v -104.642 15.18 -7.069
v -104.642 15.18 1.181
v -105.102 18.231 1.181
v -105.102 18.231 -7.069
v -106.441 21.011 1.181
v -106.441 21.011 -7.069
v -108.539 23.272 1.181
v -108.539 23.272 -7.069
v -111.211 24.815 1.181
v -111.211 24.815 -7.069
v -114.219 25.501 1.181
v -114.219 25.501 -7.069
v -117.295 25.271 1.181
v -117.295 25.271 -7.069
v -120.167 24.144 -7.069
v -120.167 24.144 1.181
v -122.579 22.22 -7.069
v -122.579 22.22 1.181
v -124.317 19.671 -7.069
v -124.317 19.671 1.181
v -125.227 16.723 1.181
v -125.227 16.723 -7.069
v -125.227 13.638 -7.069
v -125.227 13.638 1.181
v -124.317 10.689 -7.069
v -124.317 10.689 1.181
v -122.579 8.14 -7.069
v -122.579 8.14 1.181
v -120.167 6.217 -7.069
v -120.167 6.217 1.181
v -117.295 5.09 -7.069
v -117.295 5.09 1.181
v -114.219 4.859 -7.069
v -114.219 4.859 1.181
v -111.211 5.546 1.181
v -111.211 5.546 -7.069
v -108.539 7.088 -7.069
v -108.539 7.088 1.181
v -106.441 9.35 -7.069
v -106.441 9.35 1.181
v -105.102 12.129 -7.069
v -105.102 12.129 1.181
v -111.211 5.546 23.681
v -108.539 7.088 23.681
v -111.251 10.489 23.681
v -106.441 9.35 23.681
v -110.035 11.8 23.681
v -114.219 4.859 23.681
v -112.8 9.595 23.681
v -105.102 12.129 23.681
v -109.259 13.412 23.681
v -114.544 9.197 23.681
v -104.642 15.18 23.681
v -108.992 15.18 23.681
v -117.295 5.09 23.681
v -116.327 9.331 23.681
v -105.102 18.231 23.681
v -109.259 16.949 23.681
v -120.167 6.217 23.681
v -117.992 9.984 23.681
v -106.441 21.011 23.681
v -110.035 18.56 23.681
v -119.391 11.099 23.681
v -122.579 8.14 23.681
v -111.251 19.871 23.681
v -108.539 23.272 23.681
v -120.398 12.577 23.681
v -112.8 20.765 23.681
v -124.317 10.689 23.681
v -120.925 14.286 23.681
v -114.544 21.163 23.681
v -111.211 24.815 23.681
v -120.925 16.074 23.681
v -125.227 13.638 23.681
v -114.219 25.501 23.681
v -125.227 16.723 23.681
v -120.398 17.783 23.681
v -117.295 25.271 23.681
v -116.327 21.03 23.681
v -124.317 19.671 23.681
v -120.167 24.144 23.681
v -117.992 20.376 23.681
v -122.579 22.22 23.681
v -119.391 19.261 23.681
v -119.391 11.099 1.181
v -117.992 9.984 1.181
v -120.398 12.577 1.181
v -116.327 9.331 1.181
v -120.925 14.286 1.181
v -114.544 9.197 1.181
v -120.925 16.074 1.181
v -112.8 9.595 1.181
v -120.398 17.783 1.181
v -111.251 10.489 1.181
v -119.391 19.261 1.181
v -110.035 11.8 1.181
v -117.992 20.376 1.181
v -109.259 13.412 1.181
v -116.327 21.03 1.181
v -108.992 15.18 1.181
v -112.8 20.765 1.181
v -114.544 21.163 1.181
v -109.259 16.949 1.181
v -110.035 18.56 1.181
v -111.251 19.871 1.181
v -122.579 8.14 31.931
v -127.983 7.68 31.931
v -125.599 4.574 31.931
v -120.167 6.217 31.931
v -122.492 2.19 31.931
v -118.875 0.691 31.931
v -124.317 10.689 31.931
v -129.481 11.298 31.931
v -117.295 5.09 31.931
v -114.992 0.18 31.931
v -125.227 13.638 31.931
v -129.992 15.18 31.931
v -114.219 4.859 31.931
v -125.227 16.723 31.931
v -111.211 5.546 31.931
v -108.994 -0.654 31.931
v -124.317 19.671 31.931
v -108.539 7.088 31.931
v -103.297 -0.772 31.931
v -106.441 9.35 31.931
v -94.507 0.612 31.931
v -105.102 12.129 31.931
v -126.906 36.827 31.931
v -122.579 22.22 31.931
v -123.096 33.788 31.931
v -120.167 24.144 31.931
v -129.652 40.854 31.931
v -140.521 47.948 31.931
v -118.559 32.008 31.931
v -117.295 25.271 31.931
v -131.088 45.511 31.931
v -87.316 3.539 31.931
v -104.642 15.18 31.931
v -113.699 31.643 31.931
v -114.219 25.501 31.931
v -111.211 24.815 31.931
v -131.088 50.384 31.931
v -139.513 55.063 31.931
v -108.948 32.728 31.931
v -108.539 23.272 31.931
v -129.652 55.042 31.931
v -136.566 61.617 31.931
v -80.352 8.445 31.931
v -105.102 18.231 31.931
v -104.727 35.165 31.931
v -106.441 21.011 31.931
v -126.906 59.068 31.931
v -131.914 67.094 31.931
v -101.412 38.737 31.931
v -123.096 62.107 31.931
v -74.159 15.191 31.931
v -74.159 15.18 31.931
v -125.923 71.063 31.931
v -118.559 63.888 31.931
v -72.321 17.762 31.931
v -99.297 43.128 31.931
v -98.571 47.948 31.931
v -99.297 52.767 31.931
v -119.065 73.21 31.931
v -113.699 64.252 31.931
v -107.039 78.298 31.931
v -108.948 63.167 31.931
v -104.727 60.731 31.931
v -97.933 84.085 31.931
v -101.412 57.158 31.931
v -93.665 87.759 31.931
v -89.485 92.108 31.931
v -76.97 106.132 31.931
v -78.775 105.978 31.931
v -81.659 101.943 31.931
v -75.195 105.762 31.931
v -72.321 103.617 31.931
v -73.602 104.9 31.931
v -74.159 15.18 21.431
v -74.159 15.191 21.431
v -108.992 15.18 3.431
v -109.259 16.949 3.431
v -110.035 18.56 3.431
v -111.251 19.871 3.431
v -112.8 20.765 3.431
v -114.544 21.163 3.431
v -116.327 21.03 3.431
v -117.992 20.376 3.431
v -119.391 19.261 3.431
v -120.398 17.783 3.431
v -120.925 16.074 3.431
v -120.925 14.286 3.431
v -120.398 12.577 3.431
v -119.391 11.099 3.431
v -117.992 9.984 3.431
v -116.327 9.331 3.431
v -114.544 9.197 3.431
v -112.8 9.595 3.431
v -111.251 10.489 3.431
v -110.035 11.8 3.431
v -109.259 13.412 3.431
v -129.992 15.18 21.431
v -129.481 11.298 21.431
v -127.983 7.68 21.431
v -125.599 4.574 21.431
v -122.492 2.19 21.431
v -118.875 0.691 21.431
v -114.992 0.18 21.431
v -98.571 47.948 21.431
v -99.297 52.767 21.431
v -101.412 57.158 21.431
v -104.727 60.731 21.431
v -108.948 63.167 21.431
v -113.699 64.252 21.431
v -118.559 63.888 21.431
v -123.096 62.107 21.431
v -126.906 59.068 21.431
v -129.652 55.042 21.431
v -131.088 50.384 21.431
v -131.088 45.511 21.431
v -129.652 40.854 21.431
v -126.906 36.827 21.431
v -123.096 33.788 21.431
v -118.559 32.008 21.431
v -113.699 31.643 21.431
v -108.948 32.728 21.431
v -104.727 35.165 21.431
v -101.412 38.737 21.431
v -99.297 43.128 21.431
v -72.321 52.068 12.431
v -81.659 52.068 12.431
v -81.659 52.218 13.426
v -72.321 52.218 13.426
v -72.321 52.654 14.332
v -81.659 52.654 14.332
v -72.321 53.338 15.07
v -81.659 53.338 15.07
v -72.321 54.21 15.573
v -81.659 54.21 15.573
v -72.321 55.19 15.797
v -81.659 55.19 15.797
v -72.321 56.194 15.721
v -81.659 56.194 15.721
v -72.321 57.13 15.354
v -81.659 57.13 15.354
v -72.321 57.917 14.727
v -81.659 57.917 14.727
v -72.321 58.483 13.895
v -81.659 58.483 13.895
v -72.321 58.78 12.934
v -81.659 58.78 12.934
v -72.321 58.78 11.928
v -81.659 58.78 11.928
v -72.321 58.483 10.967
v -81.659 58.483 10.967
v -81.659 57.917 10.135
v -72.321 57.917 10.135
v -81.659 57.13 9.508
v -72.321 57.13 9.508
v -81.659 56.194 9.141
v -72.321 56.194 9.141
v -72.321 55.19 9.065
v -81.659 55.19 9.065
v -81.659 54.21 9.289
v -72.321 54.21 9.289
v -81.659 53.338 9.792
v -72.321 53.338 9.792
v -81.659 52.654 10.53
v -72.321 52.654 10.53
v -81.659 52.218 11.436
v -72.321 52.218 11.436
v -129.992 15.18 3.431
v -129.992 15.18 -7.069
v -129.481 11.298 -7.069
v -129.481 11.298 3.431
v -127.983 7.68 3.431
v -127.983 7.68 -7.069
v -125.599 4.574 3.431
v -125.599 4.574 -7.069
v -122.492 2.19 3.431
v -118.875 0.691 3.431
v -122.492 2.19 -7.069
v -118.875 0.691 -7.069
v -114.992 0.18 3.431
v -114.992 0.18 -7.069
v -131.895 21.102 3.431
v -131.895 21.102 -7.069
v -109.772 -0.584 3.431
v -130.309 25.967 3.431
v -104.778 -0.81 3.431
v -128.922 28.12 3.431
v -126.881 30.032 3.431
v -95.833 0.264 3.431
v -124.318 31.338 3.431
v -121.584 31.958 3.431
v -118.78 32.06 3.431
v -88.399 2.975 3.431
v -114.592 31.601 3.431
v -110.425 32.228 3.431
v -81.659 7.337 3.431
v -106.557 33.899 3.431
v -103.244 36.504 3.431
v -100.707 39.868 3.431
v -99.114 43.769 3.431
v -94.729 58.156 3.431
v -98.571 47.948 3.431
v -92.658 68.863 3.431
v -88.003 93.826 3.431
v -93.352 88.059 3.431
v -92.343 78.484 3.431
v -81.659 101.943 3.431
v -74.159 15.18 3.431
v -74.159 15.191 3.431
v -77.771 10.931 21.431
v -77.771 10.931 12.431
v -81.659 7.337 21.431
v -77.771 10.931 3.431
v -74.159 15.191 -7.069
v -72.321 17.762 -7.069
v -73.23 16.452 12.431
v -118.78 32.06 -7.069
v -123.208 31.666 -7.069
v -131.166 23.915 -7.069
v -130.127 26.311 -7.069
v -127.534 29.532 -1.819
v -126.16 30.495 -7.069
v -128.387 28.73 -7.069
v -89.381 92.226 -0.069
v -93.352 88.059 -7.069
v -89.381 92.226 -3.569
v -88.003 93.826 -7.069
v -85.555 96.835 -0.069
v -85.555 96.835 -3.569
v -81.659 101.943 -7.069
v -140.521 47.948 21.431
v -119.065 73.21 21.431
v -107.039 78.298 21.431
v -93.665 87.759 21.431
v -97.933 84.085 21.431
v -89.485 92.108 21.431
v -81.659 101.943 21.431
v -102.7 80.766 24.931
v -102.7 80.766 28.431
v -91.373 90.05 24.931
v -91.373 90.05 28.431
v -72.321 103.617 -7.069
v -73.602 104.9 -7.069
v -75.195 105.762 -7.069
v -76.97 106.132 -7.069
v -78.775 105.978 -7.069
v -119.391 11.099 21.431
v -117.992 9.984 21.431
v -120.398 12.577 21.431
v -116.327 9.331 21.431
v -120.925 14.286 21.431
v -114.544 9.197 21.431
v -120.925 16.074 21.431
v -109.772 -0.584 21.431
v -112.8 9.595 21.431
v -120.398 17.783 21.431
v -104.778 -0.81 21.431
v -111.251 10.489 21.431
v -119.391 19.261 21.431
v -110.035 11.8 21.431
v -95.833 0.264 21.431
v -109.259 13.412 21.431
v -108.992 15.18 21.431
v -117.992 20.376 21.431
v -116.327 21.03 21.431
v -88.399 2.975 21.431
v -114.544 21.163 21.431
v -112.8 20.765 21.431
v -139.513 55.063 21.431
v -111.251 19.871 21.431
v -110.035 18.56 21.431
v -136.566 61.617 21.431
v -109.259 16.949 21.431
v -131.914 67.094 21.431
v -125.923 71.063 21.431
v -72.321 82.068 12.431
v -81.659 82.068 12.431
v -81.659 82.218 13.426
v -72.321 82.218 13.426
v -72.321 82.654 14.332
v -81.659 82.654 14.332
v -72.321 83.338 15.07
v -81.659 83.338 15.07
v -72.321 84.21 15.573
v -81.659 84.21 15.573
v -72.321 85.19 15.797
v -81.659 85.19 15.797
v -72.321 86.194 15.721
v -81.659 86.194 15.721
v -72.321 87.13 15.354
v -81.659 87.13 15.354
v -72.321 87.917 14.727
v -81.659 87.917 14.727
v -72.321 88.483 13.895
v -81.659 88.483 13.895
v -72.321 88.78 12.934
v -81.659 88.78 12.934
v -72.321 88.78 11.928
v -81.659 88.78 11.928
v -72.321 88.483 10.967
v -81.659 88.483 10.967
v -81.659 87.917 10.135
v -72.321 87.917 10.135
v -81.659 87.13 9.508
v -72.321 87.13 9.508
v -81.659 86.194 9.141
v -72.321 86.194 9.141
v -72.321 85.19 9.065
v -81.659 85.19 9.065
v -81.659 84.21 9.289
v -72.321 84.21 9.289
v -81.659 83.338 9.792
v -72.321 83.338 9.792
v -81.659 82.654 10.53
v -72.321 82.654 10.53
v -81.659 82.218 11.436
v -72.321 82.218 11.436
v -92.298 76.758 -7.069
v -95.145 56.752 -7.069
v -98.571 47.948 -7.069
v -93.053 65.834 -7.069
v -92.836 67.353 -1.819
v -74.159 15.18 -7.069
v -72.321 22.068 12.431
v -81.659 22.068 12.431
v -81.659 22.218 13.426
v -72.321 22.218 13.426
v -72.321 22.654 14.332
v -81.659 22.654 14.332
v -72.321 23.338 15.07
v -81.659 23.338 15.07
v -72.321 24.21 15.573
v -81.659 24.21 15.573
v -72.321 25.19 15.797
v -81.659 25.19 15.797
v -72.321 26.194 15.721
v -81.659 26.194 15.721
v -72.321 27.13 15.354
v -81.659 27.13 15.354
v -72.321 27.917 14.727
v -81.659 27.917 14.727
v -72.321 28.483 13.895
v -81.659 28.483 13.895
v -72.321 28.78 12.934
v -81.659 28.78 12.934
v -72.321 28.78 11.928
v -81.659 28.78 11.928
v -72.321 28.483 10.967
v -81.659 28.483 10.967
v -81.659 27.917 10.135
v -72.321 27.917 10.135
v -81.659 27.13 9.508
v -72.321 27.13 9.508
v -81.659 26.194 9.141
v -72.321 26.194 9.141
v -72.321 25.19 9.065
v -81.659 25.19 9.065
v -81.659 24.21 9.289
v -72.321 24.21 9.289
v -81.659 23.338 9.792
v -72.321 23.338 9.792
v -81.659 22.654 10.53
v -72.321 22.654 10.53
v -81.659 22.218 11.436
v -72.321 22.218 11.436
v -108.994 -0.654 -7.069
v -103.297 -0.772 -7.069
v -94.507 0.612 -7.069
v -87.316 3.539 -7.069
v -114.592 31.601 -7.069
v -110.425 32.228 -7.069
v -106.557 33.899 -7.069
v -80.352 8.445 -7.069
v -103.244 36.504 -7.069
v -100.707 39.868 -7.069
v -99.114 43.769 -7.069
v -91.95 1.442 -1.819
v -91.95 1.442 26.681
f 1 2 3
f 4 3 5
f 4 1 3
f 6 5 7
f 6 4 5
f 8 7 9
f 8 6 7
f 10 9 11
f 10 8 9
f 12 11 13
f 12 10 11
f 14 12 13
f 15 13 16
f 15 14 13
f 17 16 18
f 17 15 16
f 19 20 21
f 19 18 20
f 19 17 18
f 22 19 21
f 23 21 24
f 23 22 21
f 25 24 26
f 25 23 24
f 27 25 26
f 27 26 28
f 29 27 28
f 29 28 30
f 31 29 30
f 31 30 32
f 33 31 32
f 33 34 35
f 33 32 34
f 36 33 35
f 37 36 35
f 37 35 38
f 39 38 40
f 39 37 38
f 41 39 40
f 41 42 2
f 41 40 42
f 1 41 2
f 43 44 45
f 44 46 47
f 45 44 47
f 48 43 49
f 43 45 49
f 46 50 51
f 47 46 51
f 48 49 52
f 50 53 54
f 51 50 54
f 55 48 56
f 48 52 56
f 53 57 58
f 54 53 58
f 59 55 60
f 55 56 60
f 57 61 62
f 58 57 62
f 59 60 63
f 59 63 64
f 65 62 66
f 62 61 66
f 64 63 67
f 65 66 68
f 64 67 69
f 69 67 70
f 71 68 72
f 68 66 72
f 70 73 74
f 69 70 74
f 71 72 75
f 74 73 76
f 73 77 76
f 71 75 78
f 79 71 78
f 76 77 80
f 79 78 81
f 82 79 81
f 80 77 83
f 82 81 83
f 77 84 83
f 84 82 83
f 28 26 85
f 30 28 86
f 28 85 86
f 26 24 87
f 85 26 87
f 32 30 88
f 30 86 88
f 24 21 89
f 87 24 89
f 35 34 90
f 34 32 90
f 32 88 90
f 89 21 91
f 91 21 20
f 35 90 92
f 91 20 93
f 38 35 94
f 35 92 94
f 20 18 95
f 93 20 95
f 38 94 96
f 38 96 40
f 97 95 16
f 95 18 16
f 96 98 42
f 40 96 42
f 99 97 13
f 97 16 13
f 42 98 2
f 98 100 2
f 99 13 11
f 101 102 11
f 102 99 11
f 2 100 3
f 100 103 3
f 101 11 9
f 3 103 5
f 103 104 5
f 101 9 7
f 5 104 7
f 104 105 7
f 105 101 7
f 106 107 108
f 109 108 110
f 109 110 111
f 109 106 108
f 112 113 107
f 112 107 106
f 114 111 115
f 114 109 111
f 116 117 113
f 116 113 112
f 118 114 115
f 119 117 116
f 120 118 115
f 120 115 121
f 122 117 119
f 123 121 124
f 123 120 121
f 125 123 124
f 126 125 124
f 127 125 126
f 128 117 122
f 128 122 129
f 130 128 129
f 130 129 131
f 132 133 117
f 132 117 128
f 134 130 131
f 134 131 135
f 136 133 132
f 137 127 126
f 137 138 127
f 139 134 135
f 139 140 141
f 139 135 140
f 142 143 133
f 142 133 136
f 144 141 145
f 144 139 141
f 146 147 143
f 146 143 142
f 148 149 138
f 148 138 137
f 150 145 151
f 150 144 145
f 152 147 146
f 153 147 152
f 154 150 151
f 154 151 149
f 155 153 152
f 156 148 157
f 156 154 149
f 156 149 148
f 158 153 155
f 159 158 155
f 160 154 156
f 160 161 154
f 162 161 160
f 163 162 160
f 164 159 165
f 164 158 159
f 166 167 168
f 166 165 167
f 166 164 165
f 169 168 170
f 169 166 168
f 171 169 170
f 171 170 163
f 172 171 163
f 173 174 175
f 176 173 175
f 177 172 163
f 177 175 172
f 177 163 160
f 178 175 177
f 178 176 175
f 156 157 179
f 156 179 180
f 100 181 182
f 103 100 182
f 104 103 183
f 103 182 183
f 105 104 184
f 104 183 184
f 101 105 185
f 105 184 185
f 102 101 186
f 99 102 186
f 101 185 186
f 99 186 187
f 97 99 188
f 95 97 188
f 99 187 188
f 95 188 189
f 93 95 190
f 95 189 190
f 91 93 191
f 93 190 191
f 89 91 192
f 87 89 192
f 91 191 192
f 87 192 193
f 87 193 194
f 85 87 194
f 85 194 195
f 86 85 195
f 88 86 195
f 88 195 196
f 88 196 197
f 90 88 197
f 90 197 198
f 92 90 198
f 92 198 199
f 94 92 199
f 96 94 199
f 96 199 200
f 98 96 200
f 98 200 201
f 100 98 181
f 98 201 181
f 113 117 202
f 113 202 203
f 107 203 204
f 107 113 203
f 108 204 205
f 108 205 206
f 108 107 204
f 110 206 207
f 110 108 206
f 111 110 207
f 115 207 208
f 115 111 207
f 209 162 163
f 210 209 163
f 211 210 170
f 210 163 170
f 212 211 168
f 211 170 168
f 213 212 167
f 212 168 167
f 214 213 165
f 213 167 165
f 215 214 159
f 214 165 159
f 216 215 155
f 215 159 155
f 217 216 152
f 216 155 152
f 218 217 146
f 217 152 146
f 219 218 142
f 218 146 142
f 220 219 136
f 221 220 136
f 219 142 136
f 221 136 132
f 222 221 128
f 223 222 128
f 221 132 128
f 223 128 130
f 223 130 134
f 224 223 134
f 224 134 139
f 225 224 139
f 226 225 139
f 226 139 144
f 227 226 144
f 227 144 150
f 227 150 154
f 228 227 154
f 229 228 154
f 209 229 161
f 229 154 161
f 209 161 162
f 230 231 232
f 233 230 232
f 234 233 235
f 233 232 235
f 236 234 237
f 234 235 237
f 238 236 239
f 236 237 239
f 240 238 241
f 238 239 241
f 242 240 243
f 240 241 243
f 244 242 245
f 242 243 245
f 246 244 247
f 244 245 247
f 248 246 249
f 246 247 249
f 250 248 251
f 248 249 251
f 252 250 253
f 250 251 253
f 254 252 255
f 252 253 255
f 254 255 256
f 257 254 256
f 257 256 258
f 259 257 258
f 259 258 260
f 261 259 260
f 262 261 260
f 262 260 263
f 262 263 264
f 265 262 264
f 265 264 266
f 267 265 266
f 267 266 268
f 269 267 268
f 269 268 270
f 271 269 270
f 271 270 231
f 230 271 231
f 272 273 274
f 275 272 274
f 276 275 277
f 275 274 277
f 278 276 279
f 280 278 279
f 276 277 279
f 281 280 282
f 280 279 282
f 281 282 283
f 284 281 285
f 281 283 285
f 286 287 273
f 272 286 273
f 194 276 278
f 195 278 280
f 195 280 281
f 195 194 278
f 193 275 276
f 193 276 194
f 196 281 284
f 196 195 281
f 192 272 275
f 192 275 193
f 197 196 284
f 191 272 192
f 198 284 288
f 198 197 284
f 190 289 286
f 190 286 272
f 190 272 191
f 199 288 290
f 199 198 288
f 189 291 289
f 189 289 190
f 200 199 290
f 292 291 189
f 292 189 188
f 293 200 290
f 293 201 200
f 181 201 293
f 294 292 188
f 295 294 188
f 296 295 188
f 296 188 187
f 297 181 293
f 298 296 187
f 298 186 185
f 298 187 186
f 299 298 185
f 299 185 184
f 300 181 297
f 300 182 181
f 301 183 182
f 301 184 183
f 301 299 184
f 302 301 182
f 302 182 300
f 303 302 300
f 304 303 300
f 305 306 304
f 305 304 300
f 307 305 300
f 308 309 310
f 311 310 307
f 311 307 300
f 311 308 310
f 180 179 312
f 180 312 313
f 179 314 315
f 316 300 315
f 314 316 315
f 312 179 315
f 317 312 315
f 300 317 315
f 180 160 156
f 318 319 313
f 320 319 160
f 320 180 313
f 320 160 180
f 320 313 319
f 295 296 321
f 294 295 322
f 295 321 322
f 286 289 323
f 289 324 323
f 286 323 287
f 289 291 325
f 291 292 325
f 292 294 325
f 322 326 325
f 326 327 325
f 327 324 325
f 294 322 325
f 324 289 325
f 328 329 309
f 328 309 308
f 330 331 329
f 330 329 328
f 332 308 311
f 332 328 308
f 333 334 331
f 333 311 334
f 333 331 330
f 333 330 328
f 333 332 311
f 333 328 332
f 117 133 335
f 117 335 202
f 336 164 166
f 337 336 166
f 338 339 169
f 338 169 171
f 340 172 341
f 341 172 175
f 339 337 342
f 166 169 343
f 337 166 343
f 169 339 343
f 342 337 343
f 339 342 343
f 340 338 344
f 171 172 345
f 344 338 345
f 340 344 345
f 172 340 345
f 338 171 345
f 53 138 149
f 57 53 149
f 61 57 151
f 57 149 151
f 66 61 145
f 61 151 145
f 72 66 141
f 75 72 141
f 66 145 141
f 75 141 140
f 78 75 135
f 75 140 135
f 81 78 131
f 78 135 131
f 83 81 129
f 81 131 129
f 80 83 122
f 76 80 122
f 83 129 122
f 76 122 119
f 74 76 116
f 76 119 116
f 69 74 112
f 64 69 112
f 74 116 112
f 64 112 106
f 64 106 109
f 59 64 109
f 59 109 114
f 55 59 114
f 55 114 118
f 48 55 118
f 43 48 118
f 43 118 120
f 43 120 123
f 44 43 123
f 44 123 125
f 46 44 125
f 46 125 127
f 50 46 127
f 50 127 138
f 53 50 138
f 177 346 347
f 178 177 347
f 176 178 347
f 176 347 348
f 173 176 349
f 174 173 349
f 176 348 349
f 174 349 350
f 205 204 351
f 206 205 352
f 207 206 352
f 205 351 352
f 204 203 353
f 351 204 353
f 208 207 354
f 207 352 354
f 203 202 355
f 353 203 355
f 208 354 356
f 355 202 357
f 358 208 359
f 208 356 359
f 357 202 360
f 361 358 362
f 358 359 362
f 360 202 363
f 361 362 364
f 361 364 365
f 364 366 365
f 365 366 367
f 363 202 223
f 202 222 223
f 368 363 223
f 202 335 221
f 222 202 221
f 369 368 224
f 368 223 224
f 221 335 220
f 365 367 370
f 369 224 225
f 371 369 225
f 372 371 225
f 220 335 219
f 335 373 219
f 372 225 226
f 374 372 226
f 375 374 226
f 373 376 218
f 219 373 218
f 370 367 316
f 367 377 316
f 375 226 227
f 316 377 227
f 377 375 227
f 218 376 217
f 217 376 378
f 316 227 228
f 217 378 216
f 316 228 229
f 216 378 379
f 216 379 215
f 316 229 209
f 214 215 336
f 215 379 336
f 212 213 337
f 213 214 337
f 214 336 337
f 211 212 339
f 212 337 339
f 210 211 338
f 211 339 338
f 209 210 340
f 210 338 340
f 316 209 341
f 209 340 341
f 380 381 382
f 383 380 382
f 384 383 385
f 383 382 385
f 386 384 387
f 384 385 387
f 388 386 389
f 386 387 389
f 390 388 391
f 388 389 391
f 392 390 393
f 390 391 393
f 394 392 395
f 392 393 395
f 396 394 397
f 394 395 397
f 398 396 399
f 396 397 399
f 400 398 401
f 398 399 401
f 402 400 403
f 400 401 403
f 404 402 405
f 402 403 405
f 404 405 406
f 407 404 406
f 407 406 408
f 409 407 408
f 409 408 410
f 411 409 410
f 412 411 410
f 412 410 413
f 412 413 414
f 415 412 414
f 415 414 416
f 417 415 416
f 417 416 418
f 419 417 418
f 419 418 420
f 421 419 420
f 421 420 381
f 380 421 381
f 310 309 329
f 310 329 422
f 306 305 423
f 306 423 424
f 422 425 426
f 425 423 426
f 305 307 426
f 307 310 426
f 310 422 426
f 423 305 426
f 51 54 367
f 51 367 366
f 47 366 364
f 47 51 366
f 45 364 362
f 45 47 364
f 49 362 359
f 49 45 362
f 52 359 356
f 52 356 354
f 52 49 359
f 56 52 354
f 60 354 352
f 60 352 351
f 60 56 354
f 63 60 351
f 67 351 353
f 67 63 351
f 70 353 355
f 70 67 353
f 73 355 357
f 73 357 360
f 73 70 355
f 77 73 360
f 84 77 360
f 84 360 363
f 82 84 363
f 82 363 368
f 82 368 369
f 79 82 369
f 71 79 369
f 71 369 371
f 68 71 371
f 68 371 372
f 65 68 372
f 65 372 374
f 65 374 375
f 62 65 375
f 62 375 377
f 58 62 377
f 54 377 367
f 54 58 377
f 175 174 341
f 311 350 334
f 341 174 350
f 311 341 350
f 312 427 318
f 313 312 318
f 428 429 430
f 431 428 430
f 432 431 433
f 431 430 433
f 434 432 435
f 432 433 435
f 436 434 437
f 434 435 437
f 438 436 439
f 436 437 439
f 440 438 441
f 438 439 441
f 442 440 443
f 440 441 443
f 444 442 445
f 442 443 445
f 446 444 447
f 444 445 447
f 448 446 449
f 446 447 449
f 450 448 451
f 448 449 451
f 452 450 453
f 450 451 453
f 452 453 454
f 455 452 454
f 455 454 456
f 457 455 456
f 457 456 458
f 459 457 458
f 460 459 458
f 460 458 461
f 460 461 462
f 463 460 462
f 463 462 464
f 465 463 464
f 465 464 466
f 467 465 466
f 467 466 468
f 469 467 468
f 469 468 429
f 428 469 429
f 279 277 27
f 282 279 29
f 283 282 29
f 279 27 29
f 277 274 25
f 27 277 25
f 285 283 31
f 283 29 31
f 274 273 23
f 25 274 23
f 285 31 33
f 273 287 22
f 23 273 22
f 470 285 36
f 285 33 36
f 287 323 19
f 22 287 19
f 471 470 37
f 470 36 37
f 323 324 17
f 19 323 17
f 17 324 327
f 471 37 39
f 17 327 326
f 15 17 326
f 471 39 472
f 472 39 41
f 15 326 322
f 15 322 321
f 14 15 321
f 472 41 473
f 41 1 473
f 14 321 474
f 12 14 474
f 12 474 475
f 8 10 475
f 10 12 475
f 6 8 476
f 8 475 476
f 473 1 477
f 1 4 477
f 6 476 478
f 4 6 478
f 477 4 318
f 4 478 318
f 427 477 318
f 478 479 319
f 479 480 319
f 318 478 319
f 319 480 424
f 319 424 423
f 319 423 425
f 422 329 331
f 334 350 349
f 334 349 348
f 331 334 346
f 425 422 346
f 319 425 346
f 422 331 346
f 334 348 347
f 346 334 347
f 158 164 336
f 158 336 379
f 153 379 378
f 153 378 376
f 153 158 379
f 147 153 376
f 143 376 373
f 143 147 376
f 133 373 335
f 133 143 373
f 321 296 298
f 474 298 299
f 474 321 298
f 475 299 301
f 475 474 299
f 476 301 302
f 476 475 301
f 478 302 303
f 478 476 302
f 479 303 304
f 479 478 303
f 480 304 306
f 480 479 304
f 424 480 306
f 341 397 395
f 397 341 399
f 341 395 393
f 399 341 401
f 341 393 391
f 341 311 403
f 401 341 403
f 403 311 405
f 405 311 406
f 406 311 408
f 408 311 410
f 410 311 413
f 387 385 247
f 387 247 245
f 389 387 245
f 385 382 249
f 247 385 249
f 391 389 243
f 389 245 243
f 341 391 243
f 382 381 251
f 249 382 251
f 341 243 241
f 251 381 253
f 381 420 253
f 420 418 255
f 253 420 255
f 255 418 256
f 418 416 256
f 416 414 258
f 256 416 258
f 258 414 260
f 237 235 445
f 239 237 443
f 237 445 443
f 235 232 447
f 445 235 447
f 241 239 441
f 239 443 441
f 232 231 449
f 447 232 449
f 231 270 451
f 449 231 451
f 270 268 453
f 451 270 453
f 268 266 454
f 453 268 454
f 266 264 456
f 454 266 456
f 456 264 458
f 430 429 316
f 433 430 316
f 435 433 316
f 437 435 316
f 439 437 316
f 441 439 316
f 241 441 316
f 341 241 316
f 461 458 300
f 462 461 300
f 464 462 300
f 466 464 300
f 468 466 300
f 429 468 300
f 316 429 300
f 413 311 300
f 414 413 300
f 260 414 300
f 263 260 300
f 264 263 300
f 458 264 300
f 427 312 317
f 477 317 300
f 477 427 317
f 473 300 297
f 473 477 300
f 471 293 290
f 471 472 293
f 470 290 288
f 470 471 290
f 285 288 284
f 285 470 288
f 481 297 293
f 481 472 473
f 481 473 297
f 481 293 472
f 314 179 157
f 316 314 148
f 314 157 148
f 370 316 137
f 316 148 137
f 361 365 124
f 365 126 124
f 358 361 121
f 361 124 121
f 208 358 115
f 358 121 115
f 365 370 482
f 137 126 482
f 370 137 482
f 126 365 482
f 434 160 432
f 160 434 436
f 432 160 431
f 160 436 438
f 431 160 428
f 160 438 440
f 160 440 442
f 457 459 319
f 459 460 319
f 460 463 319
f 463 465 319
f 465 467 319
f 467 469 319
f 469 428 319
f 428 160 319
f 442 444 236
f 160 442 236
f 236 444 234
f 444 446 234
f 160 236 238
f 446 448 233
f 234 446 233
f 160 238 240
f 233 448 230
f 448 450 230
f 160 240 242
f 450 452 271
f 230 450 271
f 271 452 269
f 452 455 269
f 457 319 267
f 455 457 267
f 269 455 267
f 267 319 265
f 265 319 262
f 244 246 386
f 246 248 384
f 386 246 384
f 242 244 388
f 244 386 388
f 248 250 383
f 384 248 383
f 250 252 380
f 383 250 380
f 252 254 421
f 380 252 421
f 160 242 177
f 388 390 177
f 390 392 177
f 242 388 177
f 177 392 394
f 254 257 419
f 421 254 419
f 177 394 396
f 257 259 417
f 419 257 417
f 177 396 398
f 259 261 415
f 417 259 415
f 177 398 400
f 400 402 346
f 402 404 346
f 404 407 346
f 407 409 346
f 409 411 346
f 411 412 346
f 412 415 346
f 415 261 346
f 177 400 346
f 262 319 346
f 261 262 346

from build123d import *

# Parameters (mm, degrees)
SKETCH1_R           = 6.9
SKETCH1_R_2         = 10.9
BOSS_EXTRUDE1_DEPTH = 7
BOSS_EXTRUDE2_DEPTH = 12
CUT_EXTRUDE1_DEPTH  = 13
BOSS_EXTRUDE3_DEPTH = 26
SKETCH5_R           = 7.973914392
SKETCH5_R_2         = 4
BOSS_EXTRUDE4_DEPTH = 1.5
BOSS_EXTRUDE5_START = -1.5
SKETCH6_R           = 8.491099949
SKETCH6_R_2         = 4
BOSS_EXTRUDE5_DEPTH = 1.5
SKETCH7_R           = 2.25
CUT_EXTRUDE2_DEPTH  = 99.438905233
SCALE1_SCALE        = 1.5


with BuildPart() as part:
    # Sketch1 → Boss-Extrude1 (new body)
    with BuildSketch(Plane.XY):
        with BuildLine():
            ThreePointArc((-109.99286225, 64.498694041), (-120.238224228, 58.705152002), (-124.296770504, 47.657040238))
            Line((-124.296770504, 47.657040238), (-117.277493754, 25.812066819))
            ThreePointArc((-117.277493754, 25.812066819), (-114.348561566, 18.740999007), (-107.277493754, 15.812066819))
            add(Edge.make_bspline(
                [(-80.055270229, 25.812066819), (-90.16574855, 12.494826539), (-107.277493754, 15.812066819)],
                knots=[0, 0, 0, 1, 1, 1], degree=2))
            Line((-80.055270229, 25.812066819), (-80.055270229, 84.34418562))
            ThreePointArc((-80.055270229, 84.34418562), (-81.43033647, 86.24404293), (-83.664728026, 85.531470589))
            add(Edge.make_bspline(
                [(-109.99286225, 64.498694041), (-95.736844246, 69.471166394), (-91.130917767, 75.410465429), (-83.664728026, 85.531470589)],
                knots=[0, 0, 0, 0, 0.858728352, 0.858728352, 0.858728352, 0.858728352], degree=3))
        make_face()
        with Locations((-107.277493754, 25.812066819)):
            Circle(SKETCH1_R, mode=Mode.SUBTRACT)
        with Locations((-107.22999807, 47.657040238)):
            Circle(SKETCH1_R_2, mode=Mode.SUBTRACT)
    boss_extrude1 = extrude(amount=BOSS_EXTRUDE1_DEPTH)

    # Sketch2 → Boss-Extrude2 (add)
    with BuildSketch(Plane.XY.offset(7)):
        with BuildLine():
            Line((-85.055270217, 83.653678118), (-85.055270217, 20.583275514))
            add(Edge.make_bspline(
                [(-85.055270217, 20.583275514), (-82.371539661, 22.76114127), (-80.055270217, 25.812066834)],
                knots=[0, 0, 0, 1, 1, 1], degree=2))
            Line((-80.055270217, 25.812066834), (-80.055270229, 84.34418562))
            ThreePointArc((-80.055270229, 84.34418562), (-81.43033647, 86.24404293), (-83.664728026, 85.531470589))
            add(Edge.make_bspline(
                [(-83.664728026, 85.531470589), (-84.138702239, 84.888961408), (-84.601149423, 84.263304749), (-85.055270217, 83.653678118)],
                knots=[0, 0, 0, 0, 0.054514432, 0.054514432, 0.054514432, 0.054514432], degree=3))
        make_face()
    extrude(amount=BOSS_EXTRUDE2_DEPTH)

    # Mirror1: Boss-Extrude1 across plane
    add(boss_extrude1.mirror(Plane.XY.offset(13)))

    # Sketch3 → Cut-Extrude1 (cut)
    with BuildSketch(Plane(origin=(0, 0, 0), x_dir=(-1, 0, 0), z_dir=(0, 0, -1))):
        with BuildLine():
            Line((92.850529653, 74.397721592), (144.531216933, 88.865819457))
            Line((144.531216933, 88.865819457), (118.546118501, 29.760204905))
            add(Edge.make_bspline(
                [(107.22999807, 36.757040238), (116.864311021, 38.600442381), (118.546118501, 29.760204905)],
                knots=[0, 0, 0, 1, 1, 1], degree=2))
            ThreePointArc((107.22999807, 36.757040238), (99.522534155, 39.949576323), (96.32999807, 47.657040238))
            add(Edge.make_bspline(
                [(92.850529653, 74.397721592), (90.423550402, 60.160750292), (96.32999807, 47.657040238)],
                knots=[0, 0, 0, 1, 1, 1], degree=2))
        make_face()
    extrude(amount=-CUT_EXTRUDE1_DEPTH, mode=Mode.SUBTRACT)

    # Sketch4 → Boss-Extrude3 (add)
    with BuildSketch(Plane(origin=(0, 0, 0), x_dir=(-1, 0, 0), z_dir=(0, 0, -1))):
        with BuildLine():
            Line((83.132797407, 86.34418562), (85.055270217, 83.653678118))
            Line((85.055270217, 83.653678118), (85.055270214, 20.587782524))
            add(Edge.make_bspline(
                [(78.82999807, 27.533016311), (81.645897876, 23.355716893), (85.055270214, 20.587782524)],
                knots=[0, 0, 0, 1, 1, 1], degree=2))
            Line((78.82999807, 27.533016311), (78.82999807, 84.770259389))
            ThreePointArc((78.82999807, 84.770259389), (80.746261593, 86.200037671), (83.132797407, 86.34418562))
        make_face()
    extrude(amount=-BOSS_EXTRUDE3_DEPTH)

    # Sketch5 → Boss-Extrude4 (add)
    with BuildSketch(Plane.XY.offset(7)):
        with Locations((-107.277493754, 25.812066819)):
            Circle(SKETCH5_R)
        with Locations((-107.277493754, 25.812066819)):
            Circle(SKETCH5_R_2, mode=Mode.SUBTRACT)
    extrude(amount=-BOSS_EXTRUDE4_DEPTH)

    # Sketch6 → Boss-Extrude5 (add)
    with BuildSketch(Plane(origin=(0, 0, 19), x_dir=(-1, 0, 0), z_dir=(0, 0, -1)).offset(BOSS_EXTRUDE5_START)):
        with Locations((107.277493754, 25.812066819)):
            Circle(SKETCH6_R)
        with Locations(Location((107.277493754, 25.812066819, 0), (0, 0, 180))):
            Circle(SKETCH6_R_2, mode=Mode.SUBTRACT)
    extrude(amount=BOSS_EXTRUDE5_DEPTH)

    # Sketch7 → Cut-Extrude2 (cut, through all)
    with BuildSketch(Plane.ZY.offset(85.055270217)):
        with Locations(Location((13, 32.653678118, 0), (0, 0, 270))):
            Circle(SKETCH7_R)
        with Locations(Location((13, 52.653678118, 0), (0, 0, 270))):
            Circle(SKETCH7_R)
        with Locations(Location((13, 72.653678118, 0), (0, 0, 270))):
            Circle(SKETCH7_R)
    extrude(amount=-CUT_EXTRUDE2_DEPTH, mode=Mode.SUBTRACT)


with BuildPart() as part_1:
    # Scale1: scaled about (-91.847810328, 47.075825155, 14.137877649)
    add(part.part.scale(SCALE1_SCALE).moved(Location((45.923905164, -23.537912577, -7.068938824))))


solid = part_1.part
